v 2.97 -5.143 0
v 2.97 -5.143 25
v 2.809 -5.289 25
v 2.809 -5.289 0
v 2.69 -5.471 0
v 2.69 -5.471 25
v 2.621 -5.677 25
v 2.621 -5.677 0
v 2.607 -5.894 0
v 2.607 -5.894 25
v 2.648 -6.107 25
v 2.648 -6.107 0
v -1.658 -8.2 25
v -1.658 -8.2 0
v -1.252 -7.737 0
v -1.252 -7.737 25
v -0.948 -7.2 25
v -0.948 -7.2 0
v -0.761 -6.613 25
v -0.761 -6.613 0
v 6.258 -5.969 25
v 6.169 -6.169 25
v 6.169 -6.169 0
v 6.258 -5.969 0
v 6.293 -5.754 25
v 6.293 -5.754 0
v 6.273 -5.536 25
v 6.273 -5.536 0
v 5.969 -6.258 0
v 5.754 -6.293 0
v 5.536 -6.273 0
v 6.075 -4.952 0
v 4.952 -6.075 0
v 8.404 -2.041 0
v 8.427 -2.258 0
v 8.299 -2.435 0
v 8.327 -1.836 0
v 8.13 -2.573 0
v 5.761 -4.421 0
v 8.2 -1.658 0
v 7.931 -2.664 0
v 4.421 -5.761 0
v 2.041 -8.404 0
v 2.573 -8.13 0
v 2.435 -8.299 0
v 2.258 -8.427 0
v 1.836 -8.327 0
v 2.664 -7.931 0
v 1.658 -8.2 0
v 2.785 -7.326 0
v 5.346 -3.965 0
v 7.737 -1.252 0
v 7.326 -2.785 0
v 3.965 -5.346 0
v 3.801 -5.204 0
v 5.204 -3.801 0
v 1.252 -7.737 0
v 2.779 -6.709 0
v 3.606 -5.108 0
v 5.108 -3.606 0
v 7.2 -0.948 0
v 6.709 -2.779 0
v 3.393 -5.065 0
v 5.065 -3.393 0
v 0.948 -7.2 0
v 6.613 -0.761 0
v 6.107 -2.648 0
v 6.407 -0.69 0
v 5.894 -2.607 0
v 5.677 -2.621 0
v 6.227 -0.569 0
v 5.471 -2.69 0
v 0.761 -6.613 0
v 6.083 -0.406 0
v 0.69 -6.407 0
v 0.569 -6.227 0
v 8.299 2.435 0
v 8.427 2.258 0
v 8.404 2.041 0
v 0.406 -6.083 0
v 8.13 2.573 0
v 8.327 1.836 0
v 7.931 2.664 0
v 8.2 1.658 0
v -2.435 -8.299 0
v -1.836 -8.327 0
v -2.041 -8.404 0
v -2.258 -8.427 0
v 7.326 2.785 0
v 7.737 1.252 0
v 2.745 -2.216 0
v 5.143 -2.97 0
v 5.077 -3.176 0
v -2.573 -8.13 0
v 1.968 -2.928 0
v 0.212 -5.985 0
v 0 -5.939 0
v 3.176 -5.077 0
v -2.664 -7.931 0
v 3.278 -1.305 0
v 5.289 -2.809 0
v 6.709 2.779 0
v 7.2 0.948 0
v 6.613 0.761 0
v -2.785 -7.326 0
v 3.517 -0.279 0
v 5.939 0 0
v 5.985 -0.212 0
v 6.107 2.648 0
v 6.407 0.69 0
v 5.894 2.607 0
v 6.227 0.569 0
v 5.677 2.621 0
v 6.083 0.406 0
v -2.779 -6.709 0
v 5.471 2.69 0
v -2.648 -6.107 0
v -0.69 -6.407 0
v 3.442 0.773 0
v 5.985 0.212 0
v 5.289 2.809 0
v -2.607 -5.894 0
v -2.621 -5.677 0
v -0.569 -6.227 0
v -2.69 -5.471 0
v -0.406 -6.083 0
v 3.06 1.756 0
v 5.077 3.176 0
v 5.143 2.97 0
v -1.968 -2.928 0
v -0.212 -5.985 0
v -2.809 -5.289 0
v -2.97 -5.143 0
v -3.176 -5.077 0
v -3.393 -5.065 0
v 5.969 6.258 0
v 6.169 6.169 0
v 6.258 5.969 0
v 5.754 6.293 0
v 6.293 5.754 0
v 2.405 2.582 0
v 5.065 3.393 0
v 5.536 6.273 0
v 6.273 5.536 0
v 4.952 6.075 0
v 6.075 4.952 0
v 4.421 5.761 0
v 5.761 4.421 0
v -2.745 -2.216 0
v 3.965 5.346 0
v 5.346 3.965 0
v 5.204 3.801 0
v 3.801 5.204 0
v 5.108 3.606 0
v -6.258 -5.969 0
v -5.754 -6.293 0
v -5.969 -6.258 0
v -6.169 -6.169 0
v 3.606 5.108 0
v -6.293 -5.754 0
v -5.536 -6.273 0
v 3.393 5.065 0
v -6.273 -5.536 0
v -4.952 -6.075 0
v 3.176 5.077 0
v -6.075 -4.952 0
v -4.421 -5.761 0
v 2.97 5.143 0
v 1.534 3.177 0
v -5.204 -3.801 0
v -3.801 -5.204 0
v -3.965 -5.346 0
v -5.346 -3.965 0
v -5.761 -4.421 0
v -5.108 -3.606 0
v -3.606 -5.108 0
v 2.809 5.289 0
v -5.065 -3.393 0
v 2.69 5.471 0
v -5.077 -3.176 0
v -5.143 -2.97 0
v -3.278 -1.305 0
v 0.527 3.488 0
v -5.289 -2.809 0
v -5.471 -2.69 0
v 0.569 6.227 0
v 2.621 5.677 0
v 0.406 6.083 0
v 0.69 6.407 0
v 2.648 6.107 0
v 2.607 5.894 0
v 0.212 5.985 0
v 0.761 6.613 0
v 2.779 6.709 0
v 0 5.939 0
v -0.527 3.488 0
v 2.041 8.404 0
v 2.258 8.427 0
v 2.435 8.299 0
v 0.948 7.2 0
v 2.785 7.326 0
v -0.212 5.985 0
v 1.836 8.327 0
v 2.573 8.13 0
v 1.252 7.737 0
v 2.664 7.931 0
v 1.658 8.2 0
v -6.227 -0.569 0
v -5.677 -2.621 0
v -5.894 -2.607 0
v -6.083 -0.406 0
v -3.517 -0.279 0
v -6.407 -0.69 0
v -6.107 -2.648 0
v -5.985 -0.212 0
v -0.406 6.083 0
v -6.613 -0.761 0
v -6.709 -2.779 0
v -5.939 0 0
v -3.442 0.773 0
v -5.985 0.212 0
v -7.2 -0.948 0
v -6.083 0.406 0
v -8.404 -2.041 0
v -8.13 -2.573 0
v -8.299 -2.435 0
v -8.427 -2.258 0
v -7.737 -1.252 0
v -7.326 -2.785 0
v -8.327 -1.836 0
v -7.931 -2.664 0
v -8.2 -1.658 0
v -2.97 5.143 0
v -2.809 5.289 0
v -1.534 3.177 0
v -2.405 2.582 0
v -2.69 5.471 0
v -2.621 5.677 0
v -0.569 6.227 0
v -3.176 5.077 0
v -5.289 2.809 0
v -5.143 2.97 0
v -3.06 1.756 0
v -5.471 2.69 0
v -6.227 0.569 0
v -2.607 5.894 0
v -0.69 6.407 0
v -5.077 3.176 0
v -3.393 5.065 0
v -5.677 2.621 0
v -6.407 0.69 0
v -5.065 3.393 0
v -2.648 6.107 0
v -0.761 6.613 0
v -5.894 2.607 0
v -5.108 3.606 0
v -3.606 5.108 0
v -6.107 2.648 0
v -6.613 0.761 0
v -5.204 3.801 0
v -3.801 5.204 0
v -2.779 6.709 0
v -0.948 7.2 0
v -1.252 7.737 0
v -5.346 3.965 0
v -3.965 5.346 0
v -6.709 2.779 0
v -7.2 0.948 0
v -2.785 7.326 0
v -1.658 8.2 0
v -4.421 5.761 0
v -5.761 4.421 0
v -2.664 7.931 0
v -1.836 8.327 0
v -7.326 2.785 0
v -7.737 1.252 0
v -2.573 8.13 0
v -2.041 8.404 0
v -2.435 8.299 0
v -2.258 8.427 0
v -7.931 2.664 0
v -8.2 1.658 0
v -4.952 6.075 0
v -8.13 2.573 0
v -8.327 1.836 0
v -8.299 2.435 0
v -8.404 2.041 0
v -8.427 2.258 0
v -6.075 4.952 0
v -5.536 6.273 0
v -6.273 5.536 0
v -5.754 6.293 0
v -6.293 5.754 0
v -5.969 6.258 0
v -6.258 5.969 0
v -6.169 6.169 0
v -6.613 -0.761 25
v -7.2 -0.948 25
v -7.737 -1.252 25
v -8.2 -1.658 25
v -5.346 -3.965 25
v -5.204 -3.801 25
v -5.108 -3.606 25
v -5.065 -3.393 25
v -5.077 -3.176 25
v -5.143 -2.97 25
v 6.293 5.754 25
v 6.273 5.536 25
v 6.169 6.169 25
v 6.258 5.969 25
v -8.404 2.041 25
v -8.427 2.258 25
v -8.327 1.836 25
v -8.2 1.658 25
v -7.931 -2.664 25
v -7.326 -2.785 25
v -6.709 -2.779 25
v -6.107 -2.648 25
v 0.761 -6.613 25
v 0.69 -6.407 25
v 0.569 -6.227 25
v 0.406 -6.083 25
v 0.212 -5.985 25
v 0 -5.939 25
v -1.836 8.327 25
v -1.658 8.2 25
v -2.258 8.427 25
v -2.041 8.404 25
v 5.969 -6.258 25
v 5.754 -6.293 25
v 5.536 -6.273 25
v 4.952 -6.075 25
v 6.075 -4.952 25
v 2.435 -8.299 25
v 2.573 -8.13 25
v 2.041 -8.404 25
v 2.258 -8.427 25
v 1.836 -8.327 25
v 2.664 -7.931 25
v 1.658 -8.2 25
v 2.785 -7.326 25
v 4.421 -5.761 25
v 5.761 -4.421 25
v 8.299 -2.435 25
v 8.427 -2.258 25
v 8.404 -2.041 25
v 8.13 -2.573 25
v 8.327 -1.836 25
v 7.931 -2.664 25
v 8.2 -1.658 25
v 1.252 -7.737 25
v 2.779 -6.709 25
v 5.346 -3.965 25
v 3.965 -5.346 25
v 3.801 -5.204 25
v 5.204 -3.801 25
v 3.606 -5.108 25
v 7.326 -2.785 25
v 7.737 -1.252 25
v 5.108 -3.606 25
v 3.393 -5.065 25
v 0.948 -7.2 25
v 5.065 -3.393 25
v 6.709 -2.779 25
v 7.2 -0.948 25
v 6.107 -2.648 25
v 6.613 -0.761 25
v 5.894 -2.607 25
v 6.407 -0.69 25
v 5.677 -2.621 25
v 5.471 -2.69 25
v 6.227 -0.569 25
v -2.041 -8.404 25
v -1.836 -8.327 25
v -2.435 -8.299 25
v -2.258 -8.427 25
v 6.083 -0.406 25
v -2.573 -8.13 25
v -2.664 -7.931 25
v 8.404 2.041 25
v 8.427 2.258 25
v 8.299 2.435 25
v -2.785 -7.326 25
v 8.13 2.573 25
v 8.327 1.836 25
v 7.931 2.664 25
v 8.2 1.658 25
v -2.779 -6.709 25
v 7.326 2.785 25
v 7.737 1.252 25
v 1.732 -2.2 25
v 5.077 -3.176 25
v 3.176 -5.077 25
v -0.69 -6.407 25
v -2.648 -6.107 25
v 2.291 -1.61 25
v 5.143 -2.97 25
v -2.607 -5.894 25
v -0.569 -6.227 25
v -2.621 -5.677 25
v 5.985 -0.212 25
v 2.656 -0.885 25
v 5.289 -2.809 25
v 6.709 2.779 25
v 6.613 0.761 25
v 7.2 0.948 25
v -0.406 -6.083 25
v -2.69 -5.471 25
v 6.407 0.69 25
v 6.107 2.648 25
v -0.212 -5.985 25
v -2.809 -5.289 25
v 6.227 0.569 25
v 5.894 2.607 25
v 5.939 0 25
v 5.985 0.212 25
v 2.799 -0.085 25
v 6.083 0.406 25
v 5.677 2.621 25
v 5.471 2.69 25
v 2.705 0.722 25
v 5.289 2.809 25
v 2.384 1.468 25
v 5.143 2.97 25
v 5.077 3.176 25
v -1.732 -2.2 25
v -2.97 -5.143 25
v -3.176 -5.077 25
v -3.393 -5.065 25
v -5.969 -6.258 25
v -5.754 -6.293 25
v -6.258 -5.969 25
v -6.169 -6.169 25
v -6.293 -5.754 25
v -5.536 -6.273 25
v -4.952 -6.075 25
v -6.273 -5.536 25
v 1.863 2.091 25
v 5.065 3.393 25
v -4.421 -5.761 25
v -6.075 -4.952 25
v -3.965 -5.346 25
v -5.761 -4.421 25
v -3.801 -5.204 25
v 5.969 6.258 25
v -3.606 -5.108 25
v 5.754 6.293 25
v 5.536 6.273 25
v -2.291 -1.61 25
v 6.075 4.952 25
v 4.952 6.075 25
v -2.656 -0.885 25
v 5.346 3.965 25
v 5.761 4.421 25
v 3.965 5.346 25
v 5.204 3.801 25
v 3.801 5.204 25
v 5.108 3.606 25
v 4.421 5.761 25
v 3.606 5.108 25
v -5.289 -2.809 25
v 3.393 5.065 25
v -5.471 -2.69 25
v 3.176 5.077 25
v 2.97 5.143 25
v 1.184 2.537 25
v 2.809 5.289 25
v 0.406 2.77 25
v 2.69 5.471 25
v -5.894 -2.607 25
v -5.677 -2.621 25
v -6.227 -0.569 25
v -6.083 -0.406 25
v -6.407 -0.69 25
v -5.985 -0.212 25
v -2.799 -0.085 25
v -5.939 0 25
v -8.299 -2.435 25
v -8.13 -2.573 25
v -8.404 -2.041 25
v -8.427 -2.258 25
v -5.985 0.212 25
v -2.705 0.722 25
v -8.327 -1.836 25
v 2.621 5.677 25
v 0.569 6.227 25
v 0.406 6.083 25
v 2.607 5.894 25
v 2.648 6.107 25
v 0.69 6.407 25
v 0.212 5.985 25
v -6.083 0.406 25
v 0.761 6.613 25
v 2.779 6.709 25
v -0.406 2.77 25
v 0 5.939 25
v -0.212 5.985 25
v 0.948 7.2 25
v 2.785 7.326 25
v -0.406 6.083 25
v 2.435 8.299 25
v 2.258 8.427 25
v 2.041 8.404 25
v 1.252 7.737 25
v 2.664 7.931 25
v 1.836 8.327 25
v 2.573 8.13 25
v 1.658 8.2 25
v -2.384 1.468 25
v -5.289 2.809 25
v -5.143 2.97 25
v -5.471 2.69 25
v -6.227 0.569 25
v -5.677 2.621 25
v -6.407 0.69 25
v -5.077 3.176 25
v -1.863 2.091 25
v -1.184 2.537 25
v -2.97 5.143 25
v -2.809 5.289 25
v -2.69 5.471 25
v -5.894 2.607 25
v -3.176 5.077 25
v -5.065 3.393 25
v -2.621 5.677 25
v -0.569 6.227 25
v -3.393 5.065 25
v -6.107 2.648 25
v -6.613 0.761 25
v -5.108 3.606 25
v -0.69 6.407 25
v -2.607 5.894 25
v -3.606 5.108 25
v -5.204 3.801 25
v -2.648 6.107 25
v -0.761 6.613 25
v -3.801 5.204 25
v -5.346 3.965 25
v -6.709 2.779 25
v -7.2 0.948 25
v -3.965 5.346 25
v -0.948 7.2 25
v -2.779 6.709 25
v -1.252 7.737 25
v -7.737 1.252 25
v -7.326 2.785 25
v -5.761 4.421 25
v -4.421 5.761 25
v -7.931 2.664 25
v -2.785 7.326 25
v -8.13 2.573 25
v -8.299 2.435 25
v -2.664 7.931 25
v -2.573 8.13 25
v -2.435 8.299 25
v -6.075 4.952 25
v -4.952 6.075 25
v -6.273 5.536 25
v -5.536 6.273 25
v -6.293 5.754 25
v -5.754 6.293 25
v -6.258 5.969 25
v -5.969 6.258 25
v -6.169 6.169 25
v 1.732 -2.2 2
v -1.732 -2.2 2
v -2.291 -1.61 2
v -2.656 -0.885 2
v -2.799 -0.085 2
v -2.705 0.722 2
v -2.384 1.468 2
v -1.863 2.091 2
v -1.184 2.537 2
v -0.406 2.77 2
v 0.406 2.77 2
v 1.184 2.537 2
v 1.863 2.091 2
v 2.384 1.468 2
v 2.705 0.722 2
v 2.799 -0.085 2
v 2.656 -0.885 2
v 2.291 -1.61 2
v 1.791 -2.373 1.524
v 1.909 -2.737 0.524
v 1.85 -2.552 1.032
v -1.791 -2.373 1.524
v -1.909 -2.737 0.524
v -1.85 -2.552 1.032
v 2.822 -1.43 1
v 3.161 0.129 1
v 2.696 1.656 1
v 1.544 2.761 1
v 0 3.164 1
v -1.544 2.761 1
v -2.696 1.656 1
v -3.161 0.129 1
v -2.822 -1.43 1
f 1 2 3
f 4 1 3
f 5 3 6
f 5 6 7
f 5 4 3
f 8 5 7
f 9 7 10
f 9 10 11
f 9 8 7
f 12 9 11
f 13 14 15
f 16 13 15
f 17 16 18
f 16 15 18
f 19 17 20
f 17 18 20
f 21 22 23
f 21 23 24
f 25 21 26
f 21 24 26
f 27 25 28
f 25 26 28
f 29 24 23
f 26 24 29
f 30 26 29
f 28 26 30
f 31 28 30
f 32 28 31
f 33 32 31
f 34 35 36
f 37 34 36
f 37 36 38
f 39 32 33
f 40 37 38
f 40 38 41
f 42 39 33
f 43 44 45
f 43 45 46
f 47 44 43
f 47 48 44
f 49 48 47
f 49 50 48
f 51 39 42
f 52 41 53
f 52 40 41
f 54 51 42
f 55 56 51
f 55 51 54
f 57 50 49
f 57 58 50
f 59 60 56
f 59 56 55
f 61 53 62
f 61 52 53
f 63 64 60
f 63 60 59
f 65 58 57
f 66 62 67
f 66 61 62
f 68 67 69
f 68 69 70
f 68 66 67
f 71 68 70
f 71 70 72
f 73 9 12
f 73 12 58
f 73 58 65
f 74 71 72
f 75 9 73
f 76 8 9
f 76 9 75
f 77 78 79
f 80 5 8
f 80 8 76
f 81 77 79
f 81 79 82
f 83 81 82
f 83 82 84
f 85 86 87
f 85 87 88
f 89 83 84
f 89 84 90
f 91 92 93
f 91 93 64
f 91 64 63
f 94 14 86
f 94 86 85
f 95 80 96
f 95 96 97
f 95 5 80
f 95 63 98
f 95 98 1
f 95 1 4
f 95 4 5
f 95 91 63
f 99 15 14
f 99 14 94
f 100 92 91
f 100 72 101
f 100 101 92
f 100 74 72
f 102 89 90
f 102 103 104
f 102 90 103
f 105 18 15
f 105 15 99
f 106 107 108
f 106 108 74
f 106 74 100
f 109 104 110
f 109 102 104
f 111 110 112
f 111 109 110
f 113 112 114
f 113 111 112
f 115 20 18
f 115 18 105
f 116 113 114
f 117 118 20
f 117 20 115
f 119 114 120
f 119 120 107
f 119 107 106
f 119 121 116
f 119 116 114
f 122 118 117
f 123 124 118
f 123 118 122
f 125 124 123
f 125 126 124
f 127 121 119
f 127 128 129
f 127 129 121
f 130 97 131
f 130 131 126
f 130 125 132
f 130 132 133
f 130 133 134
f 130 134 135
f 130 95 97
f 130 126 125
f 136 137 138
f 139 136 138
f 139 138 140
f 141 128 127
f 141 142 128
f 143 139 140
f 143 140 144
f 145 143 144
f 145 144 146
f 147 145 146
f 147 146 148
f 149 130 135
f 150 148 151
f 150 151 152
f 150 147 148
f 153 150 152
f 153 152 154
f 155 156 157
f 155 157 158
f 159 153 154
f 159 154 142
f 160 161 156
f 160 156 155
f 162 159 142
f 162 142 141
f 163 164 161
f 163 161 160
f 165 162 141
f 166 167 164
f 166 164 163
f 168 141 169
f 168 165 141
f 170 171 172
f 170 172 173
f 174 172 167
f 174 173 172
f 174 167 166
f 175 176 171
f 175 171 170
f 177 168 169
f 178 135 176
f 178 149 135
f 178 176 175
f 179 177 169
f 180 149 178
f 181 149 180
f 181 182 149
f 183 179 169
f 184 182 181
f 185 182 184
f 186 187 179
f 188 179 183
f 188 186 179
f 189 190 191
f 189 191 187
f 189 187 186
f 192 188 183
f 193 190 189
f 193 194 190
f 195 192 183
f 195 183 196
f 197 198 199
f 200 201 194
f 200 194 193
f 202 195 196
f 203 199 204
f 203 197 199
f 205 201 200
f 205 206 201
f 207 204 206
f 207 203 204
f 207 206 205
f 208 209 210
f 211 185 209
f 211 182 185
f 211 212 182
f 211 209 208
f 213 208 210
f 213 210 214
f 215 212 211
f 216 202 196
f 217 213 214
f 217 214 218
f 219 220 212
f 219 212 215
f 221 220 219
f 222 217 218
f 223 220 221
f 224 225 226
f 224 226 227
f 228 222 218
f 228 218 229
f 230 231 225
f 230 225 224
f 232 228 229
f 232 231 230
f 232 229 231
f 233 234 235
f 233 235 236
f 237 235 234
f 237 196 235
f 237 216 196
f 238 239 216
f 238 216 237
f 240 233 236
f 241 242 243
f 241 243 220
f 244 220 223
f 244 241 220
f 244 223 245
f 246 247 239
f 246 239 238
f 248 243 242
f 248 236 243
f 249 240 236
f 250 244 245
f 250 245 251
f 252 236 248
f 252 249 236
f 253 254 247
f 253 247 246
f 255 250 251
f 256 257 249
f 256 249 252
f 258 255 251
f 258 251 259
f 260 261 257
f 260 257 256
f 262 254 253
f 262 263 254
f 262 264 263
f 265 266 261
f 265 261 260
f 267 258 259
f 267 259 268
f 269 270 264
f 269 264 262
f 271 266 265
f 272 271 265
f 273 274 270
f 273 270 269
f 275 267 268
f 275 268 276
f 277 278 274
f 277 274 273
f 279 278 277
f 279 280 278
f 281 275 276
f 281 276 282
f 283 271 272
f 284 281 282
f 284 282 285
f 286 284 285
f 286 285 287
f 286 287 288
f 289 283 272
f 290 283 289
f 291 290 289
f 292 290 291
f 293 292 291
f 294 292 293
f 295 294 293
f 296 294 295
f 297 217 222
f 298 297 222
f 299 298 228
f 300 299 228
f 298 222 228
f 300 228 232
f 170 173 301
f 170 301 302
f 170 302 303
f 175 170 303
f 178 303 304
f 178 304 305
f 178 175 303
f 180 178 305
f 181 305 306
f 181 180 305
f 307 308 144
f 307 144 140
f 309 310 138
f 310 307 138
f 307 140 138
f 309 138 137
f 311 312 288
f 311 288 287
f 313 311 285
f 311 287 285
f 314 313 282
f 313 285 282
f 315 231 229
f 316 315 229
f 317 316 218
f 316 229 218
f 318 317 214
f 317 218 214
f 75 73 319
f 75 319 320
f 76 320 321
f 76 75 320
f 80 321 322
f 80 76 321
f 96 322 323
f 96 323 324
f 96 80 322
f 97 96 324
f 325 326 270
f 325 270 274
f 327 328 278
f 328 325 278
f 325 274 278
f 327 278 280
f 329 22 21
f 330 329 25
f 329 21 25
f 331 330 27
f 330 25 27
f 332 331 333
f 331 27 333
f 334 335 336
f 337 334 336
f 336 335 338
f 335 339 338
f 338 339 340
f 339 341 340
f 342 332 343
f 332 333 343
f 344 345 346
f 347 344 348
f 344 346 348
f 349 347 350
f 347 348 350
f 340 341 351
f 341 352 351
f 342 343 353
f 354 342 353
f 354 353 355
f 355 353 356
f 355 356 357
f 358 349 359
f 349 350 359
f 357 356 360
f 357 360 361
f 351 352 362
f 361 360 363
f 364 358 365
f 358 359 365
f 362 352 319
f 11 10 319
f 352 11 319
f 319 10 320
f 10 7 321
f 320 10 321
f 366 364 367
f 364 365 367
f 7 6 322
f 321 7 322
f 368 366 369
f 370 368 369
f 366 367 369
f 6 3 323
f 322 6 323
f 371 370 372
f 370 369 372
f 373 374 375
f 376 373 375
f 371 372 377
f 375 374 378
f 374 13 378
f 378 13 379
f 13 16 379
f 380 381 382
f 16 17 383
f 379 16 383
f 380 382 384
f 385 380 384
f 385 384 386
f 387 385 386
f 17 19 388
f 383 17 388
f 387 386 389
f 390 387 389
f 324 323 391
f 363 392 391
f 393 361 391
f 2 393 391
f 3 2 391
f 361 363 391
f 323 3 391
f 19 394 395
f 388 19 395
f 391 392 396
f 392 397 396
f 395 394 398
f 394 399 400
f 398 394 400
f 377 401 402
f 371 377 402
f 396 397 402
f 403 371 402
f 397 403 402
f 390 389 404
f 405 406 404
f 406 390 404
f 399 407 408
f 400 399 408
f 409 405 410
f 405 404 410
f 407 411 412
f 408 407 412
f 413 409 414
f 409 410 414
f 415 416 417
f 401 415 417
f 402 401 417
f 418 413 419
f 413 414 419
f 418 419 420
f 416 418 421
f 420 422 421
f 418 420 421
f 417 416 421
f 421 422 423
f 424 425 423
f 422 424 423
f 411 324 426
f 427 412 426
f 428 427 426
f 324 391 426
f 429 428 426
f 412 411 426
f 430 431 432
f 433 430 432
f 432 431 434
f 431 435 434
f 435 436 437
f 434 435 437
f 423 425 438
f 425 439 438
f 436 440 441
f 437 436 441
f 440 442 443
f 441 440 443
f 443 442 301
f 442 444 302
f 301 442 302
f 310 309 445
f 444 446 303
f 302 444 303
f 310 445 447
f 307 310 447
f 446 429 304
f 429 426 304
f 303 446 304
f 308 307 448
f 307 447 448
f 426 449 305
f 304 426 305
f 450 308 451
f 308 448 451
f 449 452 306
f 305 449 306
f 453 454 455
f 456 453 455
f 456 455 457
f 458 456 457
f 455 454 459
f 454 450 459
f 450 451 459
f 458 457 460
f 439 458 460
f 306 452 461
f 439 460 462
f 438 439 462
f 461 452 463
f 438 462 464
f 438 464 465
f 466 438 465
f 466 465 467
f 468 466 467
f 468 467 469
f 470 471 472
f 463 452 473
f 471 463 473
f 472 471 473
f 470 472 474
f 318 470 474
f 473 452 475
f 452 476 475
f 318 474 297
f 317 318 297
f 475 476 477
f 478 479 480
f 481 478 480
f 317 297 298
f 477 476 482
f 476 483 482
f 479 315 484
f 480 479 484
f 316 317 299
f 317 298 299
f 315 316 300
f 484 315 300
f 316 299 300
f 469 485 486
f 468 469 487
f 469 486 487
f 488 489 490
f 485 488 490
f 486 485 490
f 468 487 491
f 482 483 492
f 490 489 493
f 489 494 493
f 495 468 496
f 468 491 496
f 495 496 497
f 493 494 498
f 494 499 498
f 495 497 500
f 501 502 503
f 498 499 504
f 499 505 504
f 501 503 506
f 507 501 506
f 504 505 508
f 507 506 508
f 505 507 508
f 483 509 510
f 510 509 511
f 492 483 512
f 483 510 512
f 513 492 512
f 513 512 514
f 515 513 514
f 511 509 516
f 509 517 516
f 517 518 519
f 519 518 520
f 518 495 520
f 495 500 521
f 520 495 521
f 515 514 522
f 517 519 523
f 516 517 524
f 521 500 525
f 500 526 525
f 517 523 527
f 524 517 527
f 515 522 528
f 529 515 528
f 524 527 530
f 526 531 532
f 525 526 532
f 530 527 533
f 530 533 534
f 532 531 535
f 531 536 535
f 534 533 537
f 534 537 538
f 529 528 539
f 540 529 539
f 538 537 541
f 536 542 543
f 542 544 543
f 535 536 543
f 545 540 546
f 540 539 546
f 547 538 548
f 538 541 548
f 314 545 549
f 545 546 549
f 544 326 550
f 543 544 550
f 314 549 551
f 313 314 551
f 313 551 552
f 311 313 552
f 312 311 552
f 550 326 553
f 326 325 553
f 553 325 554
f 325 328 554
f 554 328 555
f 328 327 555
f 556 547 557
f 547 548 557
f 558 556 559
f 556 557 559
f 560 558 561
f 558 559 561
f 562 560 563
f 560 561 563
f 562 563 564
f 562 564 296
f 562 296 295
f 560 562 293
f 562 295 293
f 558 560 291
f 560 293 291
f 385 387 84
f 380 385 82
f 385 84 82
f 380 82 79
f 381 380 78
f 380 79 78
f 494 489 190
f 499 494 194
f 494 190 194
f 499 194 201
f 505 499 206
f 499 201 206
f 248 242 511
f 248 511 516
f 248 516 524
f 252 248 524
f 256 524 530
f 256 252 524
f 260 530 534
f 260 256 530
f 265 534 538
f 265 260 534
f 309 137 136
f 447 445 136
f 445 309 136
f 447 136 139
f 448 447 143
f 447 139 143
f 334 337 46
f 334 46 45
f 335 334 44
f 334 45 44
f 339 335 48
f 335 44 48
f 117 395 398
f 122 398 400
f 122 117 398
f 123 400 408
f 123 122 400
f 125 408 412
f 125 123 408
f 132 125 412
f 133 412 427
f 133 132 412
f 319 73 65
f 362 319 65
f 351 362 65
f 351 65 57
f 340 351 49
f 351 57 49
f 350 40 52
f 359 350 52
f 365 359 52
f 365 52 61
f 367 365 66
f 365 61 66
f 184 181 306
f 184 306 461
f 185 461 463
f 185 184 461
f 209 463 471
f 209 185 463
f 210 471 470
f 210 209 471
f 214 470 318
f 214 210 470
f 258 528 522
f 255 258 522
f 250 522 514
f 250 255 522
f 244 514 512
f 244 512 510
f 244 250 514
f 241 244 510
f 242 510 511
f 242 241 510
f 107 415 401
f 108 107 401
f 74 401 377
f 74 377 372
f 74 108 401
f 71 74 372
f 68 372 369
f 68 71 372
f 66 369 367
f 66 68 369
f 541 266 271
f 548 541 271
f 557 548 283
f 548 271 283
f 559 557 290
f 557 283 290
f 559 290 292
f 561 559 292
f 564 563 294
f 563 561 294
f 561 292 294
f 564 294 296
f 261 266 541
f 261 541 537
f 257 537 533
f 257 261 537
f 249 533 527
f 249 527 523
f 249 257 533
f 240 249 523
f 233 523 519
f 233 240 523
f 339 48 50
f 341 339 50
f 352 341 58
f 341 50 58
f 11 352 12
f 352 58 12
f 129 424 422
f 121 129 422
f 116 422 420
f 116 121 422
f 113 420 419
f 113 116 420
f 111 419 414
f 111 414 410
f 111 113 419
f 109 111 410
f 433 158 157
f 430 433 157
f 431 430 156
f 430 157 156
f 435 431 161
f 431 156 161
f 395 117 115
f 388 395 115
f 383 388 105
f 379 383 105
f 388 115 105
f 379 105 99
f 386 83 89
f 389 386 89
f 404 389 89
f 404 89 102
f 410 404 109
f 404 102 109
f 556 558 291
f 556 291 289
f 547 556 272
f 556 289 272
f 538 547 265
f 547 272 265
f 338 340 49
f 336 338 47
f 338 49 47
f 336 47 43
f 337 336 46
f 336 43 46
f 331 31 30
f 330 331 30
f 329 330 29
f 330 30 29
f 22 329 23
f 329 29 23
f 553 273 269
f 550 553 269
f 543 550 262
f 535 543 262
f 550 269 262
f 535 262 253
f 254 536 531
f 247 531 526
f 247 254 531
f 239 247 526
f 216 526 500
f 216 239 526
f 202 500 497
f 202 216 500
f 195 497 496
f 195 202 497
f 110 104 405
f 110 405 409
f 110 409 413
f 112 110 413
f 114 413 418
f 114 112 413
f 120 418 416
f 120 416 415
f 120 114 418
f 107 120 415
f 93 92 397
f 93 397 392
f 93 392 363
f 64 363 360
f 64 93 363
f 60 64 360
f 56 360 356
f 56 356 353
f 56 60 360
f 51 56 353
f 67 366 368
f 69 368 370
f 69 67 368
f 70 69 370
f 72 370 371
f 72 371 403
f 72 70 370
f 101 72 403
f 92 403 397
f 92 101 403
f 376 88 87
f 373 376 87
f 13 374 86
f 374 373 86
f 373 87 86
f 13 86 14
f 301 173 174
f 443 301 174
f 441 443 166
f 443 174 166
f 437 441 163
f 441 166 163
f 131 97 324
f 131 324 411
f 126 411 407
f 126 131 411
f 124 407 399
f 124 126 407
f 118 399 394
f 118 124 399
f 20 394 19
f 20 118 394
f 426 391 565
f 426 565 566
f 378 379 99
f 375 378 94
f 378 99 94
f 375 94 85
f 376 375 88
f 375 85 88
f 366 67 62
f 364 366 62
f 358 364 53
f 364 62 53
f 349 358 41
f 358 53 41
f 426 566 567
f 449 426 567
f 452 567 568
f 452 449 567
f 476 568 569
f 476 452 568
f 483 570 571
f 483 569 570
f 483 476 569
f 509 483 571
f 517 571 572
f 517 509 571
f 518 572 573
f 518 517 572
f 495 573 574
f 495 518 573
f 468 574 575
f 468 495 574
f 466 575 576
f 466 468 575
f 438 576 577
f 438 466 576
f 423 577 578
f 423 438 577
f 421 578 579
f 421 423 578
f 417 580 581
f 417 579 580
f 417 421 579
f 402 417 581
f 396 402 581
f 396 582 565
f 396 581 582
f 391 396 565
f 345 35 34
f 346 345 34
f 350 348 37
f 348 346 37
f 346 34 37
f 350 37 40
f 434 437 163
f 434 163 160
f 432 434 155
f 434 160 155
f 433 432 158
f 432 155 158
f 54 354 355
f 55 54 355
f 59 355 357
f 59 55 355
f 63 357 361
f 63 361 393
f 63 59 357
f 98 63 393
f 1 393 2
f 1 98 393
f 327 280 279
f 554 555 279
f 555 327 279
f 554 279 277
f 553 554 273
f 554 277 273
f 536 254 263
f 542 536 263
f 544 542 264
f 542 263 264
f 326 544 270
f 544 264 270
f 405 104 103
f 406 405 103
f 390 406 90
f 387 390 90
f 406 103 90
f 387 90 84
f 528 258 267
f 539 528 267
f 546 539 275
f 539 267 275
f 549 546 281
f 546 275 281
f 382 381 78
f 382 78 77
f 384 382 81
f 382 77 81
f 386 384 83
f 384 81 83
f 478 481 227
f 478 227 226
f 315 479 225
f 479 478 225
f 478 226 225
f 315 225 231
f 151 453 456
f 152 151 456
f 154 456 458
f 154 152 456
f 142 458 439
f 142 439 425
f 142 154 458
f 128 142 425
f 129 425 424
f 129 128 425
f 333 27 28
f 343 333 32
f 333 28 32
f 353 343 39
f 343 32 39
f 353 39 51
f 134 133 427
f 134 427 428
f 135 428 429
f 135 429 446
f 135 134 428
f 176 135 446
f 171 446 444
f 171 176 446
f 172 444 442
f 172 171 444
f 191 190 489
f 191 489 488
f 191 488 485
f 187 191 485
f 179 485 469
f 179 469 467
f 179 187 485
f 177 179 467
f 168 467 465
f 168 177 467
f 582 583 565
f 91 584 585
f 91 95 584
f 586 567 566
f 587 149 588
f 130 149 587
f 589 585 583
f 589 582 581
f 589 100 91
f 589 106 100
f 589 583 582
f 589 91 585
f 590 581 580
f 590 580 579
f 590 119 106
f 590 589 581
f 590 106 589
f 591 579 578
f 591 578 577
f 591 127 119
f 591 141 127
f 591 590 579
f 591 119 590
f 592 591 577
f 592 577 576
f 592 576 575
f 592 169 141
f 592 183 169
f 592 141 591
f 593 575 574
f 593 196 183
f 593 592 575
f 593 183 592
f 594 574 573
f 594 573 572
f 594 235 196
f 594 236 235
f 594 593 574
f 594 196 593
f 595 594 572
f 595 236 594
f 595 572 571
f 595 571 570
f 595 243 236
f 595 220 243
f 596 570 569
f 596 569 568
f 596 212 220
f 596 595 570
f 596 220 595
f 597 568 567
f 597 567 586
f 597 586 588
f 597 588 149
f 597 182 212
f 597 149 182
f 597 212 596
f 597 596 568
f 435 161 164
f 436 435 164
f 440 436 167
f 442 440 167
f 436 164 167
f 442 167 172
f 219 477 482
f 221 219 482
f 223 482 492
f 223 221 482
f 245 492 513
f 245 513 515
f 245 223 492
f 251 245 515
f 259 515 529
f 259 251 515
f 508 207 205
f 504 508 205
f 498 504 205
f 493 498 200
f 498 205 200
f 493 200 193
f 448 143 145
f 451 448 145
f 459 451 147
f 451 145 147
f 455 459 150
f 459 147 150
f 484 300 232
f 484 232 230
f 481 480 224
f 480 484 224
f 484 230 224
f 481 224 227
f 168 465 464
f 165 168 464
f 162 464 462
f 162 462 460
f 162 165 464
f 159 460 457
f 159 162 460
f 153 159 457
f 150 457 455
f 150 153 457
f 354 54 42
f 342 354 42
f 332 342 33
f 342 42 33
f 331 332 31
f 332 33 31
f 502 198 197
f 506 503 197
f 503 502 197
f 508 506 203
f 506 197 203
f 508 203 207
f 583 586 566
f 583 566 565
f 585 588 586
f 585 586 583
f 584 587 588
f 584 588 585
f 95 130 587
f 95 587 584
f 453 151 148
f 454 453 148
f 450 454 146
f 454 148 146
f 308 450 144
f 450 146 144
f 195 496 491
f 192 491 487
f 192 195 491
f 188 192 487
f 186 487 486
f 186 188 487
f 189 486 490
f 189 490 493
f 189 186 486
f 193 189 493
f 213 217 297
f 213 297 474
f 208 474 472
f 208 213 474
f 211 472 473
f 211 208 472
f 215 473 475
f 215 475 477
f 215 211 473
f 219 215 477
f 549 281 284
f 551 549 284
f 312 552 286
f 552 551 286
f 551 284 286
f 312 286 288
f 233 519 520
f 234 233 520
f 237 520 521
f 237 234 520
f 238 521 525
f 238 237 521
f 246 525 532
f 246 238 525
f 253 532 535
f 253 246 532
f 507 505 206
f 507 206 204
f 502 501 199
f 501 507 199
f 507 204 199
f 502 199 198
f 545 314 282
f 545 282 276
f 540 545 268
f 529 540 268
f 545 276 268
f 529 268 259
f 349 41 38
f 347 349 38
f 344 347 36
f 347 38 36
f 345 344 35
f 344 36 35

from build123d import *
from OCP.BRepFilletAPI import BRepFilletAPI_MakeChamfer

# Parameters (mm, degrees)
BOSS_EXTRUDE1_DEPTH     = 25
FILLET1_R               = 0.85
CUT_EXTRUDE1_DEPTH      = 28.69523507
CUT_EXTRUDE1_DEPTH_BACK = 28.69523507
CHAMFER1_SIZE           = 2
CHAMFER1_SIZE2          = 0.727940469


with BuildPart() as part:
    # Sketch2 → Boss-Extrude1 (new body)
    with BuildSketch(Plane.XY):
        with BuildLine():
            ThreePointArc((5.45501044, -2.341984918), (6.905444148, -2.794619237), (8.391623483, -2.478538947))
            ThreePointArc((8.391623483, -2.478538947), (8.45185098, -2.264666645), (8.506628589, -2.049334049))
            ThreePointArc((8.506628589, -2.049334049), (7.377599675, -1.03251082), (5.895170077, -0.699286786))
            ThreePointArc((5.895170077, -0.699286786), (5.9365, 0), (5.895170077, 0.699286786))
            ThreePointArc((5.895170077, 0.699286786), (7.377599675, 1.03251082), (8.506628589, 2.049334049))
            ThreePointArc((8.506628589, 2.049334049), (8.45185098, 2.264666645), (8.391623483, 2.478538947))
            ThreePointArc((8.391623483, 2.478538947), (6.905444148, 2.794619237), (5.45501044, 2.341984918))
            ThreePointArc((5.45501044, 2.341984918), (5.14115981, 2.96825), (4.755723654, 3.55318516))
            ThreePointArc((4.755723654, 3.55318516), (5.872933327, 4.582980438), (6.342289434, 6.028089642))
            ThreePointArc((6.342289434, 6.028089642), (6.187184335, 6.187184335), (6.028089642, 6.342289434))
            ThreePointArc((6.028089642, 6.342289434), (4.582980438, 5.872933327), (3.55318516, 4.755723654))
            ThreePointArc((3.55318516, 4.755723654), (2.96825, 5.14115981), (2.341984918, 5.45501044))
            ThreePointArc((2.341984918, 5.45501044), (2.794619237, 6.905444148), (2.478538947, 8.391623483))
            ThreePointArc((2.478538947, 8.391623483), (2.264666645, 8.45185098), (2.049334049, 8.506628589))
            ThreePointArc((2.049334049, 8.506628589), (1.03251082, 7.377599675), (0.699286786, 5.895170077))
            ThreePointArc((0.699286786, 5.895170077), (0, 5.9365), (-0.699286786, 5.895170077))
            ThreePointArc((-0.699286786, 5.895170077), (-1.03251082, 7.377599675), (-2.049334049, 8.506628589))
            ThreePointArc((-2.049334049, 8.506628589), (-2.264666645, 8.45185098), (-2.478538947, 8.391623483))
            ThreePointArc((-2.478538947, 8.391623483), (-2.794619237, 6.905444148), (-2.341984918, 5.45501044))
            ThreePointArc((-2.341984918, 5.45501044), (-2.96825, 5.14115981), (-3.55318516, 4.755723654))
            ThreePointArc((-3.55318516, 4.755723654), (-4.582980438, 5.872933327), (-6.028089642, 6.342289434))
            ThreePointArc((-6.028089642, 6.342289434), (-6.187184335, 6.187184335), (-6.342289434, 6.028089642))
            ThreePointArc((-6.342289434, 6.028089642), (-5.872933327, 4.582980438), (-4.755723654, 3.55318516))
            ThreePointArc((-4.755723654, 3.55318516), (-5.14115981, 2.96825), (-5.45501044, 2.341984918))
            ThreePointArc((-5.45501044, 2.341984918), (-6.905444148, 2.794619237), (-8.391623483, 2.478538947))
            ThreePointArc((-8.391623483, 2.478538947), (-8.45185098, 2.264666645), (-8.506628589, 2.049334049))
            ThreePointArc((-8.506628589, 2.049334049), (-7.377599675, 1.03251082), (-5.895170077, 0.699286786))
            ThreePointArc((-5.895170077, 0.699286786), (-5.9365, 0), (-5.895170077, -0.699286786))
            ThreePointArc((-5.895170077, -0.699286786), (-7.377599675, -1.03251082), (-8.506628589, -2.049334049))
            ThreePointArc((-8.506628589, -2.049334049), (-8.45185098, -2.264666645), (-8.391623483, -2.478538947))
            ThreePointArc((-8.391623483, -2.478538947), (-6.905444148, -2.794619237), (-5.45501044, -2.341984918))
            ThreePointArc((-5.45501044, -2.341984918), (-5.14115981, -2.96825), (-4.755723654, -3.55318516))
            ThreePointArc((-4.755723654, -3.55318516), (-5.872933327, -4.582980438), (-6.342289434, -6.028089642))
            ThreePointArc((-6.342289434, -6.028089642), (-6.187184335, -6.187184335), (-6.028089642, -6.342289434))
            ThreePointArc((-6.028089642, -6.342289434), (-4.582980438, -5.872933327), (-3.55318516, -4.755723654))
            ThreePointArc((-3.55318516, -4.755723654), (-2.96825, -5.14115981), (-2.341984918, -5.45501044))
            ThreePointArc((-2.341984918, -5.45501044), (-2.794619237, -6.905444148), (-2.478538947, -8.391623483))
            ThreePointArc((-2.478538947, -8.391623483), (-2.264666645, -8.45185098), (-2.049334049, -8.506628589))
            ThreePointArc((-2.049334049, -8.506628589), (-1.03251082, -7.377599675), (-0.699286786, -5.895170077))
            ThreePointArc((-0.699286786, -5.895170077), (0, -5.9365), (0.699286786, -5.895170077))
            ThreePointArc((0.699286786, -5.895170077), (1.03251082, -7.377599675), (2.049334049, -8.506628589))
            ThreePointArc((2.049334049, -8.506628589), (2.264666645, -8.45185098), (2.478538947, -8.391623483))
            ThreePointArc((2.478538947, -8.391623483), (2.794619237, -6.905444148), (2.341984918, -5.45501044))
            ThreePointArc((2.341984918, -5.45501044), (2.96825, -5.14115981), (3.55318516, -4.755723654))
            ThreePointArc((3.55318516, -4.755723654), (4.582980438, -5.872933327), (6.028089642, -6.342289434))
            ThreePointArc((6.028089642, -6.342289434), (6.187184335, -6.187184335), (6.342289434, -6.028089642))
            ThreePointArc((6.342289434, -6.028089642), (5.872933327, -4.582980438), (4.755723654, -3.55318516))
            ThreePointArc((4.755723654, -3.55318516), (5.14115981, -2.96825), (5.45501044, -2.341984918))
        make_face()
    extrude(amount=BOSS_EXTRUDE1_DEPTH)

    # Fillet1
    # the kernel refuses this fillet: 0.85 mm, written as the material it adds along each edge
    with BuildSketch(Plane(origin=(-0.699286786, 5.895170077, 0), x_dir=(0.9985545717483048, 0.053747253330377776, 0), z_dir=(0, 0, 1)), Plane(origin=(2.341984918, 5.45501044, 0), x_dir=(0.8916472528643112, -0.4527307991064083, 0), z_dir=(0, 0, 1)), Plane(origin=(4.755723654, 3.55318516, 0), x_dir=(0.5458237726418961, -0.8378999995339347, 0), z_dir=(0, 0, 1)), Plane(origin=(5.895170077, 0.699286786, 0), x_dir=(0.053747253330377526, -0.9985545717483046, 0), z_dir=(0, 0, 1)), Plane(origin=(5.45501044, -2.341984918, 0), x_dir=(-0.4527307991064139, -0.8916472528643083, 0), z_dir=(0, 0, 1)), Plane(origin=(3.55318516, -4.755723654, 0), x_dir=(-0.8378999995339357, -0.5458237726418947, 0), z_dir=(0, 0, 1)), Plane(origin=(0.699286786, -5.895170077, 0), x_dir=(-0.9985545717483045, -0.053747253330380974, 0), z_dir=(0, 0, 1)), Plane(origin=(-2.341984918, -5.45501044, 0), x_dir=(-0.8916472528643078, 0.45273079910641506, 0), z_dir=(0, 0, 1)), Plane(origin=(-4.755723654, -3.55318516, 0), x_dir=(-0.5458237726418926, 0.837899999533937, 0), z_dir=(0, 0, 1)), Plane(origin=(-5.895170077, -0.699286786, 0), x_dir=(-0.05374725333036718, 0.9985545717483052, 0), z_dir=(0, 0, 1)), Plane(origin=(-5.45501044, 2.341984918, 0), x_dir=(0.4527307991064148, 0.8916472528643078, 0), z_dir=(0, 0, 1)), Plane(origin=(-3.55318516, 4.755723654, 0), x_dir=(0.8378999995339407, 0.5458237726418868, 0), z_dir=(0, 0, 1))) as fillet1_piece_1:
        with BuildLine():
            CenterArc((0.817467093, 0.848243697), FILLET1_R, 188.702518153, 77.61362583)
            ThreePointArc((-0.022747059, 0.719635073), (0.010293641, 0.360502417), (0, 0))
            ThreePointArc((0, 0), (0.381426817, 0.012266224), (0.762853635, 0))
        make_face()
    extrude(amount=25)
    with BuildSketch(Plane(origin=(0.699286786, 5.895170077, 0), x_dir=(0.08526813636279139, 0.9963580405262039, 0), z_dir=(0, 0, 1)), Plane(origin=(3.55318516, 4.755723654, 0), x_dir=(0.5720233924866368, 0.8202373061791809, 0), z_dir=(0, 0, 1)), Plane(origin=(5.45501044, 2.341984918, 0), x_dir=(0.9055054425419776, 0.42433464803956017, 0), z_dir=(0, 0, 1)), Plane(origin=(5.895170077, -0.699286786, 0), x_dir=(0.9963580405262035, -0.08526813636279691, 0), z_dir=(0, 0, 1)), Plane(origin=(4.755723654, -3.55318516, 0), x_dir=(0.8202373061791792, -0.5720233924866389, 0), z_dir=(0, 0, 1)), Plane(origin=(2.341984918, -5.45501044, 0), x_dir=(0.4243346480395612, -0.9055054425419772, 0), z_dir=(0, 0, 1)), Plane(origin=(-3.55318516, -4.755723654, 0), x_dir=(-0.5720233924866378, -0.8202373061791799, 0), z_dir=(0, 0, 1)), Plane(origin=(-5.45501044, -2.341984918, 0), x_dir=(-0.9055054425419786, -0.42433464803955767, 0), z_dir=(0, 0, 1)), Plane(origin=(-5.895170077, 0.699286786, 0), x_dir=(-0.9963580405262031, 0.08526813636279934, 0), z_dir=(0, 0, 1)), Plane(origin=(-4.755723654, 3.55318516, 0), x_dir=(-0.8202373061791736, 0.572023392486647, 0), z_dir=(0, 0, 1)), Plane(origin=(-2.341984918, 5.45501044, 0), x_dir=(-0.4243346480395532, 0.9055054425419808, 0), z_dir=(0, 0, 1))) as fillet1_piece_2:
        with BuildLine():
            CenterArc((0.82199371, 0.843857902), FILLET1_R, 185.494324585, 77.61362583)
            ThreePointArc((-0.024101124, 0.762472822), (0.000209539, 0.381623942), (0, 0))
            ThreePointArc((0, 0), (0.359997245, 0.021677992), (0.719994491, 0))
        make_face()
    extrude(amount=25)
    with BuildSketch(Plane(origin=(-0.699286786, -5.895170077, 0), x_dir=(0.9985545717483045, -0.05374725333038154, 0), z_dir=(0, 0, 1))) as fillet1_piece_3:
        with BuildLine():
            CenterArc((0.817467093, -0.848243697), FILLET1_R, 93.683856017, 77.61362583)
            ThreePointArc((-0.022747059, -0.719635073), (0.010293641, -0.360502417), (0, 0))
            ThreePointArc((0, 0), (0.381426817, -0.012266224), (0.762853635, 0))
        make_face()
    extrude(amount=25)
    # the kernel refuses this fillet: 0.85 mm, written as the material it takes off along each edge
    with BuildSketch(Plane(origin=(-2.478538947, 8.391623483, -1.241518227), x_dir=(0.9658977457013398, 0.2589238205516633, 0), z_dir=(0, 0, 1)), Plane(origin=(2.049334049, 8.506628589, -1.241518227), x_dir=(0.9659538955113092, -0.2587142666080226, 0), z_dir=(0, 0, 1)), Plane(origin=(6.028089642, 6.342289434, -1.241518227), x_dir=(0.7071834790933315, -0.7070300749596524, 0), z_dir=(0, 0, 1)), Plane(origin=(8.391623483, 2.478538947, -1.241518227), x_dir=(0.25892382055164814, -0.9658977457013438, 0), z_dir=(0, 0, 1)), Plane(origin=(8.506628589, -2.049334049, -1.241518227), x_dir=(-0.2587142666080043, -0.965953895511314, 0), z_dir=(0, 0, 1)), Plane(origin=(6.342289434, -6.028089642, -1.241518227), x_dir=(-0.7070300749596584, -0.7071834790933254, 0), z_dir=(0, 0, 1)), Plane(origin=(2.478538947, -8.391623483, -1.241518227), x_dir=(-0.9658977457013397, -0.25892382055166346, 0), z_dir=(0, 0, 1)), Plane(origin=(-2.049334049, -8.506628589, -1.241518227), x_dir=(-0.9659538955113074, 0.25871426660802904, 0), z_dir=(0, 0, 1)), Plane(origin=(-6.028089642, -6.342289434, -1.241518227), x_dir=(-0.7071834790933234, 0.7070300749596604, 0), z_dir=(0, 0, 1)), Plane(origin=(-8.506628589, 2.049334049, -1.241518227), x_dir=(0.25871426660802577, 0.9659538955113082, 0), z_dir=(0, 0, 1)), Plane(origin=(-6.342289434, 6.028089642, -1.241518227), x_dir=(0.7070300749596685, 0.7071834790933154, 0), z_dir=(0, 0, 1)), Plane(origin=(-8.391623483, -2.478538947, -1.241518227), x_dir=(-0.2589238205516369, 0.9658977457013469, 0), z_dir=(0, 0, 1))) as fillet1_2_piece_1:
        with BuildLine():
            CenterArc((0.420957609, -0.849728289), FILLET1_R, 88.551251373, 59.262022264)
            ThreePointArc((-0.298411496, -0.396950098), (-0.157433543, -0.192289716), (0, 0))
            ThreePointArc((0, 0), (0.221223969, 0.002797021), (0.442447937, 0))
        make_face()
    extrude(amount=27.483036454, mode=Mode.SUBTRACT)
    with BuildSketch(Plane(origin=(-2.049334049, 8.506628589, -1.241518227), x_dir=(0.7872385442579439, -0.6166485826097658, 0), z_dir=(0, 0, 1)), Plane(origin=(2.478538947, 8.391623483, -1.241518227), x_dir=(0.3734442868607768, -0.9276526098766962, 0), z_dir=(0, 0, 1)), Plane(origin=(6.342289434, 6.028089642, -1.241518227), x_dir=(-0.14041406561875278, -0.9900928694705425, 0), z_dir=(0, 0, 1)), Plane(origin=(8.506628589, 2.049334049, -1.241518227), x_dir=(-0.6166485826097687, -0.7872385442579418, 0), z_dir=(0, 0, 1)), Plane(origin=(8.391623483, -2.478538947, -1.241518227), x_dir=(-0.9276526098766967, -0.3734442868607755, 0), z_dir=(0, 0, 1)), Plane(origin=(6.028089642, -6.342289434, -1.241518227), x_dir=(-0.9900928694705423, 0.14041406561875375, 0), z_dir=(0, 0, 1)), Plane(origin=(2.049334049, -8.506628589, -1.241518227), x_dir=(-0.7872385442579395, 0.6166485826097715, 0), z_dir=(0, 0, 1)), Plane(origin=(-2.478538947, -8.391623483, -1.241518227), x_dir=(-0.37344428686077513, 0.927652609876697, 0), z_dir=(0, 0, 1)), Plane(origin=(-6.342289434, -6.028089642, -1.241518227), x_dir=(0.14041406561875172, 0.9900928694705425, 0), z_dir=(0, 0, 1)), Plane(origin=(-8.506628589, -2.049334049, -1.241518227), x_dir=(0.6166485826097806, 0.7872385442579324, 0), z_dir=(0, 0, 1)), Plane(origin=(-8.391623483, 2.478538947, -1.241518227), x_dir=(0.9276526098767012, 0.3734442868607644, 0), z_dir=(0, 0, 1)), Plane(origin=(-6.028089642, 6.342289434, -1.241518227), x_dir=(0.9900928694705411, -0.140414065618762, 0), z_dir=(0, 0, 1))) as fillet1_2_piece_2:
        with BuildLine():
            CenterArc((0.426254591, -0.847083525), FILLET1_R, 85.252318452, 59.262022264)
            ThreePointArc((-0.265867122, -0.35365923), (-0.135169287, -0.175148884), (0, 0))
            ThreePointArc((0, 0), (0.248303645, 0.010293443), (0.496607291, 0))
        make_face()
    extrude(amount=27.483036454, mode=Mode.SUBTRACT)

    # Sketch3 → Cut-Extrude1 (cut, two sides: drawn at the far end of the back side and taken through both)
    with BuildSketch(Plane(origin=(0, 0, 0), x_dir=(-1, 0, 0), z_dir=(0, 0, -1)).offset(-CUT_EXTRUDE1_DEPTH_BACK)):
        with BuildLine():
            Line((-1.732050808, -2.2), (1.732050808, -2.2))
            ThreePointArc((1.732050808, -2.2), (0, 2.8), (-1.732050808, -2.2))
        make_face()
    extrude(amount=CUT_EXTRUDE1_DEPTH + CUT_EXTRUDE1_DEPTH_BACK, mode=Mode.SUBTRACT)

    # Chamfer1: one chamfer whose edges measure the first distance from different faces: ONE call of the kernel's chamfer builder (chamfer() names one face for all edges)
    chamfer1_edges_1 = [part.edges().sort_by_distance(p)[0] for p in [
        (0, -2.2, 0),
    ]]
    chamfer1_side_1 = [part.faces().sort_by_distance(p)[0] for p in [
        (0, -2.2, 12.5),
    ]]
    chamfer1_edges_2 = [part.edges().sort_by_distance(p)[0] for p in [
        (0, 2.8, 0),
    ]]
    chamfer1_side_2 = [part.faces().sort_by_distance(p)[0] for p in [
        (0, 2.8, 12.5),
    ]]
    chamfer1 = BRepFilletAPI_MakeChamfer(part.part.solid().wrapped)
    for e in chamfer1_edges_1:
        chamfer1.Add(CHAMFER1_SIZE, CHAMFER1_SIZE2, e.wrapped, chamfer1_side_1[0].wrapped)  # the first distance lies on this face
    for e in chamfer1_edges_2:
        chamfer1.Add(CHAMFER1_SIZE, CHAMFER1_SIZE2, e.wrapped, chamfer1_side_2[0].wrapped)  # the first distance lies on this face
    add(Compound.cast(chamfer1.Shape()), mode=Mode.REPLACE)


solid = part.part
